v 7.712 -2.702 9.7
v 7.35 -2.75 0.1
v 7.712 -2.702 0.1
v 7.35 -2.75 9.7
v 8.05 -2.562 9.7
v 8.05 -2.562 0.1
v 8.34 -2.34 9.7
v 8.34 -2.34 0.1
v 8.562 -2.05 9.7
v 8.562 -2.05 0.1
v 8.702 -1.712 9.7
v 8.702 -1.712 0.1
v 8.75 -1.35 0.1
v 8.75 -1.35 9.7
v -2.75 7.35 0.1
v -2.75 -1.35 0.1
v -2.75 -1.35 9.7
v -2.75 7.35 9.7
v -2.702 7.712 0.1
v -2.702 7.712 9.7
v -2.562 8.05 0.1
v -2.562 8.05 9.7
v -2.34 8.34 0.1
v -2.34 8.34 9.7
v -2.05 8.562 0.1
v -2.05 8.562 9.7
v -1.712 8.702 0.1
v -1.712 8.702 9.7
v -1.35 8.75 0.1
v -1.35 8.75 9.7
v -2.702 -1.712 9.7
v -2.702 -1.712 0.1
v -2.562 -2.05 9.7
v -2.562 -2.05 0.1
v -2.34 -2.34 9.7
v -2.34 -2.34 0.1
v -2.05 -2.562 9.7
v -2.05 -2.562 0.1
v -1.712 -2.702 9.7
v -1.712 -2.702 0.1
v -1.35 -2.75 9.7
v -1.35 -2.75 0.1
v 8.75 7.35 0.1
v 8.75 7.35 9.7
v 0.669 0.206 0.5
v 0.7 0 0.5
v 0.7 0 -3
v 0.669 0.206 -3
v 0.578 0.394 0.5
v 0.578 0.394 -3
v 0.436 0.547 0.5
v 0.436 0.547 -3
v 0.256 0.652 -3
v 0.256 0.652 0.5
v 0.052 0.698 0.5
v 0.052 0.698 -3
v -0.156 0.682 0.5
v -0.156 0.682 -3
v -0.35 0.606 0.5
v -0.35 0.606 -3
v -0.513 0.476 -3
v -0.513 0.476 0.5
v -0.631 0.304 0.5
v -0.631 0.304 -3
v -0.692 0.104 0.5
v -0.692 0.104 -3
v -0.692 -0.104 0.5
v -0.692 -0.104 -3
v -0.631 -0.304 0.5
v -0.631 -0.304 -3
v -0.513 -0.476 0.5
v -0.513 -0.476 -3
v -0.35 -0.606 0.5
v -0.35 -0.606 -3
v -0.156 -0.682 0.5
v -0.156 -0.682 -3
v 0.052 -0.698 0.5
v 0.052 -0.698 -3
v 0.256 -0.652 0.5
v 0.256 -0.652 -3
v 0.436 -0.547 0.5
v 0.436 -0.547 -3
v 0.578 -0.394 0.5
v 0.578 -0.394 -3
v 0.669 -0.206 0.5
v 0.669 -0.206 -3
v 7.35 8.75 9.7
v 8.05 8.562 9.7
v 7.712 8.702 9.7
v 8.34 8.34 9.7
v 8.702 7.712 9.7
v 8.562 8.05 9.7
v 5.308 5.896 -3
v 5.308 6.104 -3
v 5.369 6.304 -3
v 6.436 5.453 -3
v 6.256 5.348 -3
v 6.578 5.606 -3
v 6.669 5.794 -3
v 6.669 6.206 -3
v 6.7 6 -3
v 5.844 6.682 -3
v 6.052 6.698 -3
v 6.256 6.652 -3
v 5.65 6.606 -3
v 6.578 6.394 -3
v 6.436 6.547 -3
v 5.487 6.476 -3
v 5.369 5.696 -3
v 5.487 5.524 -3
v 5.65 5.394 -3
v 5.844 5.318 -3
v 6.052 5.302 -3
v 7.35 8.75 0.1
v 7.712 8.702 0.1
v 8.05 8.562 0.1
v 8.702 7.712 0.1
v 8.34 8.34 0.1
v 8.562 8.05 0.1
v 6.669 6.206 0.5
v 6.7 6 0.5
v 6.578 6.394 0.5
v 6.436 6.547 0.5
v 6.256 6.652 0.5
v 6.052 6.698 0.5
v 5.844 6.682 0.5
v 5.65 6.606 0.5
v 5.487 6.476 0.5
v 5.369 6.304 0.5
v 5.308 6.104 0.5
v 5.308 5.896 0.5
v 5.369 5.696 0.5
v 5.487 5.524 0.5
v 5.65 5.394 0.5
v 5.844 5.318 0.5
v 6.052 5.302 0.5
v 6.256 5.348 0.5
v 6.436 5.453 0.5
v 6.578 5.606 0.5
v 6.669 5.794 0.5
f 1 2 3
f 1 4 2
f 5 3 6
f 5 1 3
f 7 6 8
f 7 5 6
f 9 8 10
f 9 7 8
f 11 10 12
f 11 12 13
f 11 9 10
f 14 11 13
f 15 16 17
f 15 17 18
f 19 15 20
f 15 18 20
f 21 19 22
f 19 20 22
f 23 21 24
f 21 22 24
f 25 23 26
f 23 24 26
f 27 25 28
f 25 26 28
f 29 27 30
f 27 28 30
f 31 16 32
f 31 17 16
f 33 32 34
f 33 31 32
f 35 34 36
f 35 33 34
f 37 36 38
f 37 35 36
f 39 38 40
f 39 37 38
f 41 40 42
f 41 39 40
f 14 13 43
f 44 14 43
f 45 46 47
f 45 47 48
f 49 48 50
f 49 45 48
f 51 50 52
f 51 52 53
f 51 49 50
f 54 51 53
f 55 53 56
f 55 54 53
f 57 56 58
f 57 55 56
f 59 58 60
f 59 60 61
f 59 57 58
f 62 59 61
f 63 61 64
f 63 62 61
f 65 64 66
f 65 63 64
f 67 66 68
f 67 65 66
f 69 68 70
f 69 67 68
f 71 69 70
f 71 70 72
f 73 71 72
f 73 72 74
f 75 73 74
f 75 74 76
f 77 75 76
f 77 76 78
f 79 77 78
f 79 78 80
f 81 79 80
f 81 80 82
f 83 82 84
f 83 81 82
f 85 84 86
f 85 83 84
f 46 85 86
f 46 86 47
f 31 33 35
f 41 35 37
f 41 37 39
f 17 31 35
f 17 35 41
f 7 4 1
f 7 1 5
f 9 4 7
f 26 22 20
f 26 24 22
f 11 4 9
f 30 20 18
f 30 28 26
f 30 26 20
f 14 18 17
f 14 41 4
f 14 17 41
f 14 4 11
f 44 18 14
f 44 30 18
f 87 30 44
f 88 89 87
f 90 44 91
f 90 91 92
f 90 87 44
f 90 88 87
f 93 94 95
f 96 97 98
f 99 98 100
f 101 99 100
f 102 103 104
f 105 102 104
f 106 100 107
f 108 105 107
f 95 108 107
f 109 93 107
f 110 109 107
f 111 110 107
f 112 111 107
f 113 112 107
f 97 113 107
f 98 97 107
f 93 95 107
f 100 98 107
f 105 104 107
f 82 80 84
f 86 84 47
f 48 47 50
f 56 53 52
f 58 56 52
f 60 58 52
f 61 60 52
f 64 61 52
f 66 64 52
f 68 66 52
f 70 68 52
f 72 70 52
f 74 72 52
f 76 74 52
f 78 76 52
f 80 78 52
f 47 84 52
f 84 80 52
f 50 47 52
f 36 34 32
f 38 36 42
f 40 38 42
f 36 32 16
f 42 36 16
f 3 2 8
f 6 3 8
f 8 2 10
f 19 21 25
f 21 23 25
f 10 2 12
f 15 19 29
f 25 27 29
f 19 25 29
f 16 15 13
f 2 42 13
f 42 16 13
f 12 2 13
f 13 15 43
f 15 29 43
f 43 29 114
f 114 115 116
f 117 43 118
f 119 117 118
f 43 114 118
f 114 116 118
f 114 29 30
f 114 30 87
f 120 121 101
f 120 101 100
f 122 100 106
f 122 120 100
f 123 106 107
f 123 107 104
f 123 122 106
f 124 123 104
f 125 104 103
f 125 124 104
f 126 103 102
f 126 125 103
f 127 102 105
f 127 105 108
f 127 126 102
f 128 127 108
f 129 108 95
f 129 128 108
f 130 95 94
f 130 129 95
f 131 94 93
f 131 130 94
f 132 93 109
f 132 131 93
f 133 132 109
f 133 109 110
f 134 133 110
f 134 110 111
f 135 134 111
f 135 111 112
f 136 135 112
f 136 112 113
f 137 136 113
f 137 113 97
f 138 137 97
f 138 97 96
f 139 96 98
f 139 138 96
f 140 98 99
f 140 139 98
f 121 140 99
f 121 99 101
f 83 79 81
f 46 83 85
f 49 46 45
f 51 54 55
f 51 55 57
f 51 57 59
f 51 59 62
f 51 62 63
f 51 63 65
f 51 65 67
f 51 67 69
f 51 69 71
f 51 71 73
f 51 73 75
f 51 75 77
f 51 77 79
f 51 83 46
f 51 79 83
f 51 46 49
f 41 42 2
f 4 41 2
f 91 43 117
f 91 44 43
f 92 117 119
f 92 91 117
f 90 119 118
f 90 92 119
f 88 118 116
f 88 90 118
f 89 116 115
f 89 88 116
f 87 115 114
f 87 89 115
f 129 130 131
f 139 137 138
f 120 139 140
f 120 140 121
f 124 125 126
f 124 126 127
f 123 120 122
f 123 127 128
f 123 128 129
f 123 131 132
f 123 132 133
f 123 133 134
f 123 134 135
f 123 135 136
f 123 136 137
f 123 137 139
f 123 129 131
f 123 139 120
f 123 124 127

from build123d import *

# Parameters (mm, degrees)
SKETCH001_R  = 0.7
PAD001_DEPTH = 3.5
SKETCH_W     = 11.5
SKETCH_H     = 11.5
PAD_DEPTH    = 9.6
FILLET_R     = 1.4


with BuildPart() as pad001:
    # Sketch001 → Pad001 (new body)
    with BuildSketch(Plane.XY.offset(0.5)):
        Circle(SKETCH001_R)
        with Locations((6, 6)):
            Circle(SKETCH001_R)
    extrude(amount=-PAD001_DEPTH)


with BuildPart() as fillet_body:
    # Sketch → Pad (new body)
    with BuildSketch(Plane.XY.offset(0.1)):
        with Locations((3, 3)):
            Rectangle(SKETCH_W, SKETCH_H)
    extrude(amount=PAD_DEPTH)

    # Fillet
    fillet_edges = [fillet_body.edges().sort_by_distance(p)[0] for p in [
        (8.75, -2.75, 4.9),
        (8.75, 8.75, 4.9),
        (-2.75, -2.75, 4.9),
        (-2.75, 8.75, 4.9),
    ]]
    fillet(fillet_edges, radius=FILLET_R)


solid = Compound([pad001.part, fillet_body.part])
